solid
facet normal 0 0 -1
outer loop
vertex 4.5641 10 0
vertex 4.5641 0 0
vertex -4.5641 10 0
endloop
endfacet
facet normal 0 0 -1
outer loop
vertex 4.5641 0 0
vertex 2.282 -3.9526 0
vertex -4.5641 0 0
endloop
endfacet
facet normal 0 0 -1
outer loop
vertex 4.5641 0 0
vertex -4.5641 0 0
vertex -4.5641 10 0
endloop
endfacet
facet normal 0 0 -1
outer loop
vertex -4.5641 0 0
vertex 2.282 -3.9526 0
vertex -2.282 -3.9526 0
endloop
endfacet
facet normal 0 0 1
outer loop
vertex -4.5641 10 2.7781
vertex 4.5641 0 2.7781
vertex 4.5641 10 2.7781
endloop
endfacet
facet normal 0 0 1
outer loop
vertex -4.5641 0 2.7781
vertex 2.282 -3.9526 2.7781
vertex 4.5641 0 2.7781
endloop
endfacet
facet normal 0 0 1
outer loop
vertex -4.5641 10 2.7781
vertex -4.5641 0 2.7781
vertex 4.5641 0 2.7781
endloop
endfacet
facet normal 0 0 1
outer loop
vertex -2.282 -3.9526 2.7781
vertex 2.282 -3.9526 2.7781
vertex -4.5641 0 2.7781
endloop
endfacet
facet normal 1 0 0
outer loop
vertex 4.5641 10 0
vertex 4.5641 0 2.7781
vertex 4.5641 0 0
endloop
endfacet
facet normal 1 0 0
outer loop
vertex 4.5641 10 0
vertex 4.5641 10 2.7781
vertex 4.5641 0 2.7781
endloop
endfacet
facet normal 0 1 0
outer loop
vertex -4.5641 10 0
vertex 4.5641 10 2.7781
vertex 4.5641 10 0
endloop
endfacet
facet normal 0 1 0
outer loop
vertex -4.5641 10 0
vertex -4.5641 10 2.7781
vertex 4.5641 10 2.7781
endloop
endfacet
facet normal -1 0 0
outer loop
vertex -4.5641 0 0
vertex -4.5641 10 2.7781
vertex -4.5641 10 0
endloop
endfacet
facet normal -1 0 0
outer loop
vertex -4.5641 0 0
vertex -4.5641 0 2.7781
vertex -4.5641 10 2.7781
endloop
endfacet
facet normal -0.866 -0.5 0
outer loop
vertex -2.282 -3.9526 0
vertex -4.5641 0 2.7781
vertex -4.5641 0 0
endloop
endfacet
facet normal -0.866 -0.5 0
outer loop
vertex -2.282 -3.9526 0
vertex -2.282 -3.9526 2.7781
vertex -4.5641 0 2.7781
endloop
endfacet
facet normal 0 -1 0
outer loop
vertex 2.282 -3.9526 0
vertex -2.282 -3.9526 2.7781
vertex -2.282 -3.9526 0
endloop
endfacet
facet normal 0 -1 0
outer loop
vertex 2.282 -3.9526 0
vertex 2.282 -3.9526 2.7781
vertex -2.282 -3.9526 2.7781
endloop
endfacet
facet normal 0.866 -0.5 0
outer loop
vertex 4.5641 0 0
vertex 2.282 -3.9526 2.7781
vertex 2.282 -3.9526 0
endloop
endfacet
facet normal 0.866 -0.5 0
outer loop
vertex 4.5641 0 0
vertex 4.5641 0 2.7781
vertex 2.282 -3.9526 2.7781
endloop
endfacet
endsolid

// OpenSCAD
// A small module defining some #6 hardware shapes
// Use solid=true to get the ouerall size of a cutout
// Use tol = .1 (or similar) to allow for printer inaccuracy
// 
IN_TO_MM = 25.4;

//translate ([0, 0, 13]) hex_nut6(tol=0.0, solid=false);
//machine_screw6(1/2 * IN_TO_MM, tol=0.0);
hex_nut6_slot(10);

module hex_nut6(tol = 0, solid = false) {
    nut6_outer_dia = IN_TO_MM * 23 / 64;
    nut6_thickness = IN_TO_MM * 7 / 64;
    diameter6      = IN_TO_MM * 9 / 64;
    
    linear_extrude (nut6_thickness+tol) {
        difference () {
            circle(tol + nut6_outer_dia/2, $fn = 6);
            if (!solid)
                circle(diameter6/2, $fn = 24);
        }

    }
}


module machine_screw6(length, tol=0)
{
    head_height6 = IN_TO_MM * 0.083;
    head_dia6    = IN_TO_MM * 0.262;
    diameter6    = IN_TO_MM * 0.138;
    union() {
        translate([0, 0, tol]) {
            cylinder(head_height6, tol+head_dia6/2, tol+diameter6/2, $fn=24);
            cylinder(length-tol, tol+diameter6/2, tol+diameter6/2, $fn=24);
        }
        cylinder(tol+.01, tol+head_dia6/2, tol+head_dia6/2, $fn=24);
    }
}


module hex_nut6_slot(length, tol = 0) {
    nut6_outer_dia = IN_TO_MM * 23 / 64;
    nut6_thickness = IN_TO_MM * 7 / 64;
    
    linear_extrude (nut6_thickness+tol) {
        circle(tol + nut6_outer_dia/2, $fn = 6);
        translate([-(tol + nut6_outer_dia/2), 0, 0])
            square([tol + nut6_outer_dia, length]);
    }
}
        
